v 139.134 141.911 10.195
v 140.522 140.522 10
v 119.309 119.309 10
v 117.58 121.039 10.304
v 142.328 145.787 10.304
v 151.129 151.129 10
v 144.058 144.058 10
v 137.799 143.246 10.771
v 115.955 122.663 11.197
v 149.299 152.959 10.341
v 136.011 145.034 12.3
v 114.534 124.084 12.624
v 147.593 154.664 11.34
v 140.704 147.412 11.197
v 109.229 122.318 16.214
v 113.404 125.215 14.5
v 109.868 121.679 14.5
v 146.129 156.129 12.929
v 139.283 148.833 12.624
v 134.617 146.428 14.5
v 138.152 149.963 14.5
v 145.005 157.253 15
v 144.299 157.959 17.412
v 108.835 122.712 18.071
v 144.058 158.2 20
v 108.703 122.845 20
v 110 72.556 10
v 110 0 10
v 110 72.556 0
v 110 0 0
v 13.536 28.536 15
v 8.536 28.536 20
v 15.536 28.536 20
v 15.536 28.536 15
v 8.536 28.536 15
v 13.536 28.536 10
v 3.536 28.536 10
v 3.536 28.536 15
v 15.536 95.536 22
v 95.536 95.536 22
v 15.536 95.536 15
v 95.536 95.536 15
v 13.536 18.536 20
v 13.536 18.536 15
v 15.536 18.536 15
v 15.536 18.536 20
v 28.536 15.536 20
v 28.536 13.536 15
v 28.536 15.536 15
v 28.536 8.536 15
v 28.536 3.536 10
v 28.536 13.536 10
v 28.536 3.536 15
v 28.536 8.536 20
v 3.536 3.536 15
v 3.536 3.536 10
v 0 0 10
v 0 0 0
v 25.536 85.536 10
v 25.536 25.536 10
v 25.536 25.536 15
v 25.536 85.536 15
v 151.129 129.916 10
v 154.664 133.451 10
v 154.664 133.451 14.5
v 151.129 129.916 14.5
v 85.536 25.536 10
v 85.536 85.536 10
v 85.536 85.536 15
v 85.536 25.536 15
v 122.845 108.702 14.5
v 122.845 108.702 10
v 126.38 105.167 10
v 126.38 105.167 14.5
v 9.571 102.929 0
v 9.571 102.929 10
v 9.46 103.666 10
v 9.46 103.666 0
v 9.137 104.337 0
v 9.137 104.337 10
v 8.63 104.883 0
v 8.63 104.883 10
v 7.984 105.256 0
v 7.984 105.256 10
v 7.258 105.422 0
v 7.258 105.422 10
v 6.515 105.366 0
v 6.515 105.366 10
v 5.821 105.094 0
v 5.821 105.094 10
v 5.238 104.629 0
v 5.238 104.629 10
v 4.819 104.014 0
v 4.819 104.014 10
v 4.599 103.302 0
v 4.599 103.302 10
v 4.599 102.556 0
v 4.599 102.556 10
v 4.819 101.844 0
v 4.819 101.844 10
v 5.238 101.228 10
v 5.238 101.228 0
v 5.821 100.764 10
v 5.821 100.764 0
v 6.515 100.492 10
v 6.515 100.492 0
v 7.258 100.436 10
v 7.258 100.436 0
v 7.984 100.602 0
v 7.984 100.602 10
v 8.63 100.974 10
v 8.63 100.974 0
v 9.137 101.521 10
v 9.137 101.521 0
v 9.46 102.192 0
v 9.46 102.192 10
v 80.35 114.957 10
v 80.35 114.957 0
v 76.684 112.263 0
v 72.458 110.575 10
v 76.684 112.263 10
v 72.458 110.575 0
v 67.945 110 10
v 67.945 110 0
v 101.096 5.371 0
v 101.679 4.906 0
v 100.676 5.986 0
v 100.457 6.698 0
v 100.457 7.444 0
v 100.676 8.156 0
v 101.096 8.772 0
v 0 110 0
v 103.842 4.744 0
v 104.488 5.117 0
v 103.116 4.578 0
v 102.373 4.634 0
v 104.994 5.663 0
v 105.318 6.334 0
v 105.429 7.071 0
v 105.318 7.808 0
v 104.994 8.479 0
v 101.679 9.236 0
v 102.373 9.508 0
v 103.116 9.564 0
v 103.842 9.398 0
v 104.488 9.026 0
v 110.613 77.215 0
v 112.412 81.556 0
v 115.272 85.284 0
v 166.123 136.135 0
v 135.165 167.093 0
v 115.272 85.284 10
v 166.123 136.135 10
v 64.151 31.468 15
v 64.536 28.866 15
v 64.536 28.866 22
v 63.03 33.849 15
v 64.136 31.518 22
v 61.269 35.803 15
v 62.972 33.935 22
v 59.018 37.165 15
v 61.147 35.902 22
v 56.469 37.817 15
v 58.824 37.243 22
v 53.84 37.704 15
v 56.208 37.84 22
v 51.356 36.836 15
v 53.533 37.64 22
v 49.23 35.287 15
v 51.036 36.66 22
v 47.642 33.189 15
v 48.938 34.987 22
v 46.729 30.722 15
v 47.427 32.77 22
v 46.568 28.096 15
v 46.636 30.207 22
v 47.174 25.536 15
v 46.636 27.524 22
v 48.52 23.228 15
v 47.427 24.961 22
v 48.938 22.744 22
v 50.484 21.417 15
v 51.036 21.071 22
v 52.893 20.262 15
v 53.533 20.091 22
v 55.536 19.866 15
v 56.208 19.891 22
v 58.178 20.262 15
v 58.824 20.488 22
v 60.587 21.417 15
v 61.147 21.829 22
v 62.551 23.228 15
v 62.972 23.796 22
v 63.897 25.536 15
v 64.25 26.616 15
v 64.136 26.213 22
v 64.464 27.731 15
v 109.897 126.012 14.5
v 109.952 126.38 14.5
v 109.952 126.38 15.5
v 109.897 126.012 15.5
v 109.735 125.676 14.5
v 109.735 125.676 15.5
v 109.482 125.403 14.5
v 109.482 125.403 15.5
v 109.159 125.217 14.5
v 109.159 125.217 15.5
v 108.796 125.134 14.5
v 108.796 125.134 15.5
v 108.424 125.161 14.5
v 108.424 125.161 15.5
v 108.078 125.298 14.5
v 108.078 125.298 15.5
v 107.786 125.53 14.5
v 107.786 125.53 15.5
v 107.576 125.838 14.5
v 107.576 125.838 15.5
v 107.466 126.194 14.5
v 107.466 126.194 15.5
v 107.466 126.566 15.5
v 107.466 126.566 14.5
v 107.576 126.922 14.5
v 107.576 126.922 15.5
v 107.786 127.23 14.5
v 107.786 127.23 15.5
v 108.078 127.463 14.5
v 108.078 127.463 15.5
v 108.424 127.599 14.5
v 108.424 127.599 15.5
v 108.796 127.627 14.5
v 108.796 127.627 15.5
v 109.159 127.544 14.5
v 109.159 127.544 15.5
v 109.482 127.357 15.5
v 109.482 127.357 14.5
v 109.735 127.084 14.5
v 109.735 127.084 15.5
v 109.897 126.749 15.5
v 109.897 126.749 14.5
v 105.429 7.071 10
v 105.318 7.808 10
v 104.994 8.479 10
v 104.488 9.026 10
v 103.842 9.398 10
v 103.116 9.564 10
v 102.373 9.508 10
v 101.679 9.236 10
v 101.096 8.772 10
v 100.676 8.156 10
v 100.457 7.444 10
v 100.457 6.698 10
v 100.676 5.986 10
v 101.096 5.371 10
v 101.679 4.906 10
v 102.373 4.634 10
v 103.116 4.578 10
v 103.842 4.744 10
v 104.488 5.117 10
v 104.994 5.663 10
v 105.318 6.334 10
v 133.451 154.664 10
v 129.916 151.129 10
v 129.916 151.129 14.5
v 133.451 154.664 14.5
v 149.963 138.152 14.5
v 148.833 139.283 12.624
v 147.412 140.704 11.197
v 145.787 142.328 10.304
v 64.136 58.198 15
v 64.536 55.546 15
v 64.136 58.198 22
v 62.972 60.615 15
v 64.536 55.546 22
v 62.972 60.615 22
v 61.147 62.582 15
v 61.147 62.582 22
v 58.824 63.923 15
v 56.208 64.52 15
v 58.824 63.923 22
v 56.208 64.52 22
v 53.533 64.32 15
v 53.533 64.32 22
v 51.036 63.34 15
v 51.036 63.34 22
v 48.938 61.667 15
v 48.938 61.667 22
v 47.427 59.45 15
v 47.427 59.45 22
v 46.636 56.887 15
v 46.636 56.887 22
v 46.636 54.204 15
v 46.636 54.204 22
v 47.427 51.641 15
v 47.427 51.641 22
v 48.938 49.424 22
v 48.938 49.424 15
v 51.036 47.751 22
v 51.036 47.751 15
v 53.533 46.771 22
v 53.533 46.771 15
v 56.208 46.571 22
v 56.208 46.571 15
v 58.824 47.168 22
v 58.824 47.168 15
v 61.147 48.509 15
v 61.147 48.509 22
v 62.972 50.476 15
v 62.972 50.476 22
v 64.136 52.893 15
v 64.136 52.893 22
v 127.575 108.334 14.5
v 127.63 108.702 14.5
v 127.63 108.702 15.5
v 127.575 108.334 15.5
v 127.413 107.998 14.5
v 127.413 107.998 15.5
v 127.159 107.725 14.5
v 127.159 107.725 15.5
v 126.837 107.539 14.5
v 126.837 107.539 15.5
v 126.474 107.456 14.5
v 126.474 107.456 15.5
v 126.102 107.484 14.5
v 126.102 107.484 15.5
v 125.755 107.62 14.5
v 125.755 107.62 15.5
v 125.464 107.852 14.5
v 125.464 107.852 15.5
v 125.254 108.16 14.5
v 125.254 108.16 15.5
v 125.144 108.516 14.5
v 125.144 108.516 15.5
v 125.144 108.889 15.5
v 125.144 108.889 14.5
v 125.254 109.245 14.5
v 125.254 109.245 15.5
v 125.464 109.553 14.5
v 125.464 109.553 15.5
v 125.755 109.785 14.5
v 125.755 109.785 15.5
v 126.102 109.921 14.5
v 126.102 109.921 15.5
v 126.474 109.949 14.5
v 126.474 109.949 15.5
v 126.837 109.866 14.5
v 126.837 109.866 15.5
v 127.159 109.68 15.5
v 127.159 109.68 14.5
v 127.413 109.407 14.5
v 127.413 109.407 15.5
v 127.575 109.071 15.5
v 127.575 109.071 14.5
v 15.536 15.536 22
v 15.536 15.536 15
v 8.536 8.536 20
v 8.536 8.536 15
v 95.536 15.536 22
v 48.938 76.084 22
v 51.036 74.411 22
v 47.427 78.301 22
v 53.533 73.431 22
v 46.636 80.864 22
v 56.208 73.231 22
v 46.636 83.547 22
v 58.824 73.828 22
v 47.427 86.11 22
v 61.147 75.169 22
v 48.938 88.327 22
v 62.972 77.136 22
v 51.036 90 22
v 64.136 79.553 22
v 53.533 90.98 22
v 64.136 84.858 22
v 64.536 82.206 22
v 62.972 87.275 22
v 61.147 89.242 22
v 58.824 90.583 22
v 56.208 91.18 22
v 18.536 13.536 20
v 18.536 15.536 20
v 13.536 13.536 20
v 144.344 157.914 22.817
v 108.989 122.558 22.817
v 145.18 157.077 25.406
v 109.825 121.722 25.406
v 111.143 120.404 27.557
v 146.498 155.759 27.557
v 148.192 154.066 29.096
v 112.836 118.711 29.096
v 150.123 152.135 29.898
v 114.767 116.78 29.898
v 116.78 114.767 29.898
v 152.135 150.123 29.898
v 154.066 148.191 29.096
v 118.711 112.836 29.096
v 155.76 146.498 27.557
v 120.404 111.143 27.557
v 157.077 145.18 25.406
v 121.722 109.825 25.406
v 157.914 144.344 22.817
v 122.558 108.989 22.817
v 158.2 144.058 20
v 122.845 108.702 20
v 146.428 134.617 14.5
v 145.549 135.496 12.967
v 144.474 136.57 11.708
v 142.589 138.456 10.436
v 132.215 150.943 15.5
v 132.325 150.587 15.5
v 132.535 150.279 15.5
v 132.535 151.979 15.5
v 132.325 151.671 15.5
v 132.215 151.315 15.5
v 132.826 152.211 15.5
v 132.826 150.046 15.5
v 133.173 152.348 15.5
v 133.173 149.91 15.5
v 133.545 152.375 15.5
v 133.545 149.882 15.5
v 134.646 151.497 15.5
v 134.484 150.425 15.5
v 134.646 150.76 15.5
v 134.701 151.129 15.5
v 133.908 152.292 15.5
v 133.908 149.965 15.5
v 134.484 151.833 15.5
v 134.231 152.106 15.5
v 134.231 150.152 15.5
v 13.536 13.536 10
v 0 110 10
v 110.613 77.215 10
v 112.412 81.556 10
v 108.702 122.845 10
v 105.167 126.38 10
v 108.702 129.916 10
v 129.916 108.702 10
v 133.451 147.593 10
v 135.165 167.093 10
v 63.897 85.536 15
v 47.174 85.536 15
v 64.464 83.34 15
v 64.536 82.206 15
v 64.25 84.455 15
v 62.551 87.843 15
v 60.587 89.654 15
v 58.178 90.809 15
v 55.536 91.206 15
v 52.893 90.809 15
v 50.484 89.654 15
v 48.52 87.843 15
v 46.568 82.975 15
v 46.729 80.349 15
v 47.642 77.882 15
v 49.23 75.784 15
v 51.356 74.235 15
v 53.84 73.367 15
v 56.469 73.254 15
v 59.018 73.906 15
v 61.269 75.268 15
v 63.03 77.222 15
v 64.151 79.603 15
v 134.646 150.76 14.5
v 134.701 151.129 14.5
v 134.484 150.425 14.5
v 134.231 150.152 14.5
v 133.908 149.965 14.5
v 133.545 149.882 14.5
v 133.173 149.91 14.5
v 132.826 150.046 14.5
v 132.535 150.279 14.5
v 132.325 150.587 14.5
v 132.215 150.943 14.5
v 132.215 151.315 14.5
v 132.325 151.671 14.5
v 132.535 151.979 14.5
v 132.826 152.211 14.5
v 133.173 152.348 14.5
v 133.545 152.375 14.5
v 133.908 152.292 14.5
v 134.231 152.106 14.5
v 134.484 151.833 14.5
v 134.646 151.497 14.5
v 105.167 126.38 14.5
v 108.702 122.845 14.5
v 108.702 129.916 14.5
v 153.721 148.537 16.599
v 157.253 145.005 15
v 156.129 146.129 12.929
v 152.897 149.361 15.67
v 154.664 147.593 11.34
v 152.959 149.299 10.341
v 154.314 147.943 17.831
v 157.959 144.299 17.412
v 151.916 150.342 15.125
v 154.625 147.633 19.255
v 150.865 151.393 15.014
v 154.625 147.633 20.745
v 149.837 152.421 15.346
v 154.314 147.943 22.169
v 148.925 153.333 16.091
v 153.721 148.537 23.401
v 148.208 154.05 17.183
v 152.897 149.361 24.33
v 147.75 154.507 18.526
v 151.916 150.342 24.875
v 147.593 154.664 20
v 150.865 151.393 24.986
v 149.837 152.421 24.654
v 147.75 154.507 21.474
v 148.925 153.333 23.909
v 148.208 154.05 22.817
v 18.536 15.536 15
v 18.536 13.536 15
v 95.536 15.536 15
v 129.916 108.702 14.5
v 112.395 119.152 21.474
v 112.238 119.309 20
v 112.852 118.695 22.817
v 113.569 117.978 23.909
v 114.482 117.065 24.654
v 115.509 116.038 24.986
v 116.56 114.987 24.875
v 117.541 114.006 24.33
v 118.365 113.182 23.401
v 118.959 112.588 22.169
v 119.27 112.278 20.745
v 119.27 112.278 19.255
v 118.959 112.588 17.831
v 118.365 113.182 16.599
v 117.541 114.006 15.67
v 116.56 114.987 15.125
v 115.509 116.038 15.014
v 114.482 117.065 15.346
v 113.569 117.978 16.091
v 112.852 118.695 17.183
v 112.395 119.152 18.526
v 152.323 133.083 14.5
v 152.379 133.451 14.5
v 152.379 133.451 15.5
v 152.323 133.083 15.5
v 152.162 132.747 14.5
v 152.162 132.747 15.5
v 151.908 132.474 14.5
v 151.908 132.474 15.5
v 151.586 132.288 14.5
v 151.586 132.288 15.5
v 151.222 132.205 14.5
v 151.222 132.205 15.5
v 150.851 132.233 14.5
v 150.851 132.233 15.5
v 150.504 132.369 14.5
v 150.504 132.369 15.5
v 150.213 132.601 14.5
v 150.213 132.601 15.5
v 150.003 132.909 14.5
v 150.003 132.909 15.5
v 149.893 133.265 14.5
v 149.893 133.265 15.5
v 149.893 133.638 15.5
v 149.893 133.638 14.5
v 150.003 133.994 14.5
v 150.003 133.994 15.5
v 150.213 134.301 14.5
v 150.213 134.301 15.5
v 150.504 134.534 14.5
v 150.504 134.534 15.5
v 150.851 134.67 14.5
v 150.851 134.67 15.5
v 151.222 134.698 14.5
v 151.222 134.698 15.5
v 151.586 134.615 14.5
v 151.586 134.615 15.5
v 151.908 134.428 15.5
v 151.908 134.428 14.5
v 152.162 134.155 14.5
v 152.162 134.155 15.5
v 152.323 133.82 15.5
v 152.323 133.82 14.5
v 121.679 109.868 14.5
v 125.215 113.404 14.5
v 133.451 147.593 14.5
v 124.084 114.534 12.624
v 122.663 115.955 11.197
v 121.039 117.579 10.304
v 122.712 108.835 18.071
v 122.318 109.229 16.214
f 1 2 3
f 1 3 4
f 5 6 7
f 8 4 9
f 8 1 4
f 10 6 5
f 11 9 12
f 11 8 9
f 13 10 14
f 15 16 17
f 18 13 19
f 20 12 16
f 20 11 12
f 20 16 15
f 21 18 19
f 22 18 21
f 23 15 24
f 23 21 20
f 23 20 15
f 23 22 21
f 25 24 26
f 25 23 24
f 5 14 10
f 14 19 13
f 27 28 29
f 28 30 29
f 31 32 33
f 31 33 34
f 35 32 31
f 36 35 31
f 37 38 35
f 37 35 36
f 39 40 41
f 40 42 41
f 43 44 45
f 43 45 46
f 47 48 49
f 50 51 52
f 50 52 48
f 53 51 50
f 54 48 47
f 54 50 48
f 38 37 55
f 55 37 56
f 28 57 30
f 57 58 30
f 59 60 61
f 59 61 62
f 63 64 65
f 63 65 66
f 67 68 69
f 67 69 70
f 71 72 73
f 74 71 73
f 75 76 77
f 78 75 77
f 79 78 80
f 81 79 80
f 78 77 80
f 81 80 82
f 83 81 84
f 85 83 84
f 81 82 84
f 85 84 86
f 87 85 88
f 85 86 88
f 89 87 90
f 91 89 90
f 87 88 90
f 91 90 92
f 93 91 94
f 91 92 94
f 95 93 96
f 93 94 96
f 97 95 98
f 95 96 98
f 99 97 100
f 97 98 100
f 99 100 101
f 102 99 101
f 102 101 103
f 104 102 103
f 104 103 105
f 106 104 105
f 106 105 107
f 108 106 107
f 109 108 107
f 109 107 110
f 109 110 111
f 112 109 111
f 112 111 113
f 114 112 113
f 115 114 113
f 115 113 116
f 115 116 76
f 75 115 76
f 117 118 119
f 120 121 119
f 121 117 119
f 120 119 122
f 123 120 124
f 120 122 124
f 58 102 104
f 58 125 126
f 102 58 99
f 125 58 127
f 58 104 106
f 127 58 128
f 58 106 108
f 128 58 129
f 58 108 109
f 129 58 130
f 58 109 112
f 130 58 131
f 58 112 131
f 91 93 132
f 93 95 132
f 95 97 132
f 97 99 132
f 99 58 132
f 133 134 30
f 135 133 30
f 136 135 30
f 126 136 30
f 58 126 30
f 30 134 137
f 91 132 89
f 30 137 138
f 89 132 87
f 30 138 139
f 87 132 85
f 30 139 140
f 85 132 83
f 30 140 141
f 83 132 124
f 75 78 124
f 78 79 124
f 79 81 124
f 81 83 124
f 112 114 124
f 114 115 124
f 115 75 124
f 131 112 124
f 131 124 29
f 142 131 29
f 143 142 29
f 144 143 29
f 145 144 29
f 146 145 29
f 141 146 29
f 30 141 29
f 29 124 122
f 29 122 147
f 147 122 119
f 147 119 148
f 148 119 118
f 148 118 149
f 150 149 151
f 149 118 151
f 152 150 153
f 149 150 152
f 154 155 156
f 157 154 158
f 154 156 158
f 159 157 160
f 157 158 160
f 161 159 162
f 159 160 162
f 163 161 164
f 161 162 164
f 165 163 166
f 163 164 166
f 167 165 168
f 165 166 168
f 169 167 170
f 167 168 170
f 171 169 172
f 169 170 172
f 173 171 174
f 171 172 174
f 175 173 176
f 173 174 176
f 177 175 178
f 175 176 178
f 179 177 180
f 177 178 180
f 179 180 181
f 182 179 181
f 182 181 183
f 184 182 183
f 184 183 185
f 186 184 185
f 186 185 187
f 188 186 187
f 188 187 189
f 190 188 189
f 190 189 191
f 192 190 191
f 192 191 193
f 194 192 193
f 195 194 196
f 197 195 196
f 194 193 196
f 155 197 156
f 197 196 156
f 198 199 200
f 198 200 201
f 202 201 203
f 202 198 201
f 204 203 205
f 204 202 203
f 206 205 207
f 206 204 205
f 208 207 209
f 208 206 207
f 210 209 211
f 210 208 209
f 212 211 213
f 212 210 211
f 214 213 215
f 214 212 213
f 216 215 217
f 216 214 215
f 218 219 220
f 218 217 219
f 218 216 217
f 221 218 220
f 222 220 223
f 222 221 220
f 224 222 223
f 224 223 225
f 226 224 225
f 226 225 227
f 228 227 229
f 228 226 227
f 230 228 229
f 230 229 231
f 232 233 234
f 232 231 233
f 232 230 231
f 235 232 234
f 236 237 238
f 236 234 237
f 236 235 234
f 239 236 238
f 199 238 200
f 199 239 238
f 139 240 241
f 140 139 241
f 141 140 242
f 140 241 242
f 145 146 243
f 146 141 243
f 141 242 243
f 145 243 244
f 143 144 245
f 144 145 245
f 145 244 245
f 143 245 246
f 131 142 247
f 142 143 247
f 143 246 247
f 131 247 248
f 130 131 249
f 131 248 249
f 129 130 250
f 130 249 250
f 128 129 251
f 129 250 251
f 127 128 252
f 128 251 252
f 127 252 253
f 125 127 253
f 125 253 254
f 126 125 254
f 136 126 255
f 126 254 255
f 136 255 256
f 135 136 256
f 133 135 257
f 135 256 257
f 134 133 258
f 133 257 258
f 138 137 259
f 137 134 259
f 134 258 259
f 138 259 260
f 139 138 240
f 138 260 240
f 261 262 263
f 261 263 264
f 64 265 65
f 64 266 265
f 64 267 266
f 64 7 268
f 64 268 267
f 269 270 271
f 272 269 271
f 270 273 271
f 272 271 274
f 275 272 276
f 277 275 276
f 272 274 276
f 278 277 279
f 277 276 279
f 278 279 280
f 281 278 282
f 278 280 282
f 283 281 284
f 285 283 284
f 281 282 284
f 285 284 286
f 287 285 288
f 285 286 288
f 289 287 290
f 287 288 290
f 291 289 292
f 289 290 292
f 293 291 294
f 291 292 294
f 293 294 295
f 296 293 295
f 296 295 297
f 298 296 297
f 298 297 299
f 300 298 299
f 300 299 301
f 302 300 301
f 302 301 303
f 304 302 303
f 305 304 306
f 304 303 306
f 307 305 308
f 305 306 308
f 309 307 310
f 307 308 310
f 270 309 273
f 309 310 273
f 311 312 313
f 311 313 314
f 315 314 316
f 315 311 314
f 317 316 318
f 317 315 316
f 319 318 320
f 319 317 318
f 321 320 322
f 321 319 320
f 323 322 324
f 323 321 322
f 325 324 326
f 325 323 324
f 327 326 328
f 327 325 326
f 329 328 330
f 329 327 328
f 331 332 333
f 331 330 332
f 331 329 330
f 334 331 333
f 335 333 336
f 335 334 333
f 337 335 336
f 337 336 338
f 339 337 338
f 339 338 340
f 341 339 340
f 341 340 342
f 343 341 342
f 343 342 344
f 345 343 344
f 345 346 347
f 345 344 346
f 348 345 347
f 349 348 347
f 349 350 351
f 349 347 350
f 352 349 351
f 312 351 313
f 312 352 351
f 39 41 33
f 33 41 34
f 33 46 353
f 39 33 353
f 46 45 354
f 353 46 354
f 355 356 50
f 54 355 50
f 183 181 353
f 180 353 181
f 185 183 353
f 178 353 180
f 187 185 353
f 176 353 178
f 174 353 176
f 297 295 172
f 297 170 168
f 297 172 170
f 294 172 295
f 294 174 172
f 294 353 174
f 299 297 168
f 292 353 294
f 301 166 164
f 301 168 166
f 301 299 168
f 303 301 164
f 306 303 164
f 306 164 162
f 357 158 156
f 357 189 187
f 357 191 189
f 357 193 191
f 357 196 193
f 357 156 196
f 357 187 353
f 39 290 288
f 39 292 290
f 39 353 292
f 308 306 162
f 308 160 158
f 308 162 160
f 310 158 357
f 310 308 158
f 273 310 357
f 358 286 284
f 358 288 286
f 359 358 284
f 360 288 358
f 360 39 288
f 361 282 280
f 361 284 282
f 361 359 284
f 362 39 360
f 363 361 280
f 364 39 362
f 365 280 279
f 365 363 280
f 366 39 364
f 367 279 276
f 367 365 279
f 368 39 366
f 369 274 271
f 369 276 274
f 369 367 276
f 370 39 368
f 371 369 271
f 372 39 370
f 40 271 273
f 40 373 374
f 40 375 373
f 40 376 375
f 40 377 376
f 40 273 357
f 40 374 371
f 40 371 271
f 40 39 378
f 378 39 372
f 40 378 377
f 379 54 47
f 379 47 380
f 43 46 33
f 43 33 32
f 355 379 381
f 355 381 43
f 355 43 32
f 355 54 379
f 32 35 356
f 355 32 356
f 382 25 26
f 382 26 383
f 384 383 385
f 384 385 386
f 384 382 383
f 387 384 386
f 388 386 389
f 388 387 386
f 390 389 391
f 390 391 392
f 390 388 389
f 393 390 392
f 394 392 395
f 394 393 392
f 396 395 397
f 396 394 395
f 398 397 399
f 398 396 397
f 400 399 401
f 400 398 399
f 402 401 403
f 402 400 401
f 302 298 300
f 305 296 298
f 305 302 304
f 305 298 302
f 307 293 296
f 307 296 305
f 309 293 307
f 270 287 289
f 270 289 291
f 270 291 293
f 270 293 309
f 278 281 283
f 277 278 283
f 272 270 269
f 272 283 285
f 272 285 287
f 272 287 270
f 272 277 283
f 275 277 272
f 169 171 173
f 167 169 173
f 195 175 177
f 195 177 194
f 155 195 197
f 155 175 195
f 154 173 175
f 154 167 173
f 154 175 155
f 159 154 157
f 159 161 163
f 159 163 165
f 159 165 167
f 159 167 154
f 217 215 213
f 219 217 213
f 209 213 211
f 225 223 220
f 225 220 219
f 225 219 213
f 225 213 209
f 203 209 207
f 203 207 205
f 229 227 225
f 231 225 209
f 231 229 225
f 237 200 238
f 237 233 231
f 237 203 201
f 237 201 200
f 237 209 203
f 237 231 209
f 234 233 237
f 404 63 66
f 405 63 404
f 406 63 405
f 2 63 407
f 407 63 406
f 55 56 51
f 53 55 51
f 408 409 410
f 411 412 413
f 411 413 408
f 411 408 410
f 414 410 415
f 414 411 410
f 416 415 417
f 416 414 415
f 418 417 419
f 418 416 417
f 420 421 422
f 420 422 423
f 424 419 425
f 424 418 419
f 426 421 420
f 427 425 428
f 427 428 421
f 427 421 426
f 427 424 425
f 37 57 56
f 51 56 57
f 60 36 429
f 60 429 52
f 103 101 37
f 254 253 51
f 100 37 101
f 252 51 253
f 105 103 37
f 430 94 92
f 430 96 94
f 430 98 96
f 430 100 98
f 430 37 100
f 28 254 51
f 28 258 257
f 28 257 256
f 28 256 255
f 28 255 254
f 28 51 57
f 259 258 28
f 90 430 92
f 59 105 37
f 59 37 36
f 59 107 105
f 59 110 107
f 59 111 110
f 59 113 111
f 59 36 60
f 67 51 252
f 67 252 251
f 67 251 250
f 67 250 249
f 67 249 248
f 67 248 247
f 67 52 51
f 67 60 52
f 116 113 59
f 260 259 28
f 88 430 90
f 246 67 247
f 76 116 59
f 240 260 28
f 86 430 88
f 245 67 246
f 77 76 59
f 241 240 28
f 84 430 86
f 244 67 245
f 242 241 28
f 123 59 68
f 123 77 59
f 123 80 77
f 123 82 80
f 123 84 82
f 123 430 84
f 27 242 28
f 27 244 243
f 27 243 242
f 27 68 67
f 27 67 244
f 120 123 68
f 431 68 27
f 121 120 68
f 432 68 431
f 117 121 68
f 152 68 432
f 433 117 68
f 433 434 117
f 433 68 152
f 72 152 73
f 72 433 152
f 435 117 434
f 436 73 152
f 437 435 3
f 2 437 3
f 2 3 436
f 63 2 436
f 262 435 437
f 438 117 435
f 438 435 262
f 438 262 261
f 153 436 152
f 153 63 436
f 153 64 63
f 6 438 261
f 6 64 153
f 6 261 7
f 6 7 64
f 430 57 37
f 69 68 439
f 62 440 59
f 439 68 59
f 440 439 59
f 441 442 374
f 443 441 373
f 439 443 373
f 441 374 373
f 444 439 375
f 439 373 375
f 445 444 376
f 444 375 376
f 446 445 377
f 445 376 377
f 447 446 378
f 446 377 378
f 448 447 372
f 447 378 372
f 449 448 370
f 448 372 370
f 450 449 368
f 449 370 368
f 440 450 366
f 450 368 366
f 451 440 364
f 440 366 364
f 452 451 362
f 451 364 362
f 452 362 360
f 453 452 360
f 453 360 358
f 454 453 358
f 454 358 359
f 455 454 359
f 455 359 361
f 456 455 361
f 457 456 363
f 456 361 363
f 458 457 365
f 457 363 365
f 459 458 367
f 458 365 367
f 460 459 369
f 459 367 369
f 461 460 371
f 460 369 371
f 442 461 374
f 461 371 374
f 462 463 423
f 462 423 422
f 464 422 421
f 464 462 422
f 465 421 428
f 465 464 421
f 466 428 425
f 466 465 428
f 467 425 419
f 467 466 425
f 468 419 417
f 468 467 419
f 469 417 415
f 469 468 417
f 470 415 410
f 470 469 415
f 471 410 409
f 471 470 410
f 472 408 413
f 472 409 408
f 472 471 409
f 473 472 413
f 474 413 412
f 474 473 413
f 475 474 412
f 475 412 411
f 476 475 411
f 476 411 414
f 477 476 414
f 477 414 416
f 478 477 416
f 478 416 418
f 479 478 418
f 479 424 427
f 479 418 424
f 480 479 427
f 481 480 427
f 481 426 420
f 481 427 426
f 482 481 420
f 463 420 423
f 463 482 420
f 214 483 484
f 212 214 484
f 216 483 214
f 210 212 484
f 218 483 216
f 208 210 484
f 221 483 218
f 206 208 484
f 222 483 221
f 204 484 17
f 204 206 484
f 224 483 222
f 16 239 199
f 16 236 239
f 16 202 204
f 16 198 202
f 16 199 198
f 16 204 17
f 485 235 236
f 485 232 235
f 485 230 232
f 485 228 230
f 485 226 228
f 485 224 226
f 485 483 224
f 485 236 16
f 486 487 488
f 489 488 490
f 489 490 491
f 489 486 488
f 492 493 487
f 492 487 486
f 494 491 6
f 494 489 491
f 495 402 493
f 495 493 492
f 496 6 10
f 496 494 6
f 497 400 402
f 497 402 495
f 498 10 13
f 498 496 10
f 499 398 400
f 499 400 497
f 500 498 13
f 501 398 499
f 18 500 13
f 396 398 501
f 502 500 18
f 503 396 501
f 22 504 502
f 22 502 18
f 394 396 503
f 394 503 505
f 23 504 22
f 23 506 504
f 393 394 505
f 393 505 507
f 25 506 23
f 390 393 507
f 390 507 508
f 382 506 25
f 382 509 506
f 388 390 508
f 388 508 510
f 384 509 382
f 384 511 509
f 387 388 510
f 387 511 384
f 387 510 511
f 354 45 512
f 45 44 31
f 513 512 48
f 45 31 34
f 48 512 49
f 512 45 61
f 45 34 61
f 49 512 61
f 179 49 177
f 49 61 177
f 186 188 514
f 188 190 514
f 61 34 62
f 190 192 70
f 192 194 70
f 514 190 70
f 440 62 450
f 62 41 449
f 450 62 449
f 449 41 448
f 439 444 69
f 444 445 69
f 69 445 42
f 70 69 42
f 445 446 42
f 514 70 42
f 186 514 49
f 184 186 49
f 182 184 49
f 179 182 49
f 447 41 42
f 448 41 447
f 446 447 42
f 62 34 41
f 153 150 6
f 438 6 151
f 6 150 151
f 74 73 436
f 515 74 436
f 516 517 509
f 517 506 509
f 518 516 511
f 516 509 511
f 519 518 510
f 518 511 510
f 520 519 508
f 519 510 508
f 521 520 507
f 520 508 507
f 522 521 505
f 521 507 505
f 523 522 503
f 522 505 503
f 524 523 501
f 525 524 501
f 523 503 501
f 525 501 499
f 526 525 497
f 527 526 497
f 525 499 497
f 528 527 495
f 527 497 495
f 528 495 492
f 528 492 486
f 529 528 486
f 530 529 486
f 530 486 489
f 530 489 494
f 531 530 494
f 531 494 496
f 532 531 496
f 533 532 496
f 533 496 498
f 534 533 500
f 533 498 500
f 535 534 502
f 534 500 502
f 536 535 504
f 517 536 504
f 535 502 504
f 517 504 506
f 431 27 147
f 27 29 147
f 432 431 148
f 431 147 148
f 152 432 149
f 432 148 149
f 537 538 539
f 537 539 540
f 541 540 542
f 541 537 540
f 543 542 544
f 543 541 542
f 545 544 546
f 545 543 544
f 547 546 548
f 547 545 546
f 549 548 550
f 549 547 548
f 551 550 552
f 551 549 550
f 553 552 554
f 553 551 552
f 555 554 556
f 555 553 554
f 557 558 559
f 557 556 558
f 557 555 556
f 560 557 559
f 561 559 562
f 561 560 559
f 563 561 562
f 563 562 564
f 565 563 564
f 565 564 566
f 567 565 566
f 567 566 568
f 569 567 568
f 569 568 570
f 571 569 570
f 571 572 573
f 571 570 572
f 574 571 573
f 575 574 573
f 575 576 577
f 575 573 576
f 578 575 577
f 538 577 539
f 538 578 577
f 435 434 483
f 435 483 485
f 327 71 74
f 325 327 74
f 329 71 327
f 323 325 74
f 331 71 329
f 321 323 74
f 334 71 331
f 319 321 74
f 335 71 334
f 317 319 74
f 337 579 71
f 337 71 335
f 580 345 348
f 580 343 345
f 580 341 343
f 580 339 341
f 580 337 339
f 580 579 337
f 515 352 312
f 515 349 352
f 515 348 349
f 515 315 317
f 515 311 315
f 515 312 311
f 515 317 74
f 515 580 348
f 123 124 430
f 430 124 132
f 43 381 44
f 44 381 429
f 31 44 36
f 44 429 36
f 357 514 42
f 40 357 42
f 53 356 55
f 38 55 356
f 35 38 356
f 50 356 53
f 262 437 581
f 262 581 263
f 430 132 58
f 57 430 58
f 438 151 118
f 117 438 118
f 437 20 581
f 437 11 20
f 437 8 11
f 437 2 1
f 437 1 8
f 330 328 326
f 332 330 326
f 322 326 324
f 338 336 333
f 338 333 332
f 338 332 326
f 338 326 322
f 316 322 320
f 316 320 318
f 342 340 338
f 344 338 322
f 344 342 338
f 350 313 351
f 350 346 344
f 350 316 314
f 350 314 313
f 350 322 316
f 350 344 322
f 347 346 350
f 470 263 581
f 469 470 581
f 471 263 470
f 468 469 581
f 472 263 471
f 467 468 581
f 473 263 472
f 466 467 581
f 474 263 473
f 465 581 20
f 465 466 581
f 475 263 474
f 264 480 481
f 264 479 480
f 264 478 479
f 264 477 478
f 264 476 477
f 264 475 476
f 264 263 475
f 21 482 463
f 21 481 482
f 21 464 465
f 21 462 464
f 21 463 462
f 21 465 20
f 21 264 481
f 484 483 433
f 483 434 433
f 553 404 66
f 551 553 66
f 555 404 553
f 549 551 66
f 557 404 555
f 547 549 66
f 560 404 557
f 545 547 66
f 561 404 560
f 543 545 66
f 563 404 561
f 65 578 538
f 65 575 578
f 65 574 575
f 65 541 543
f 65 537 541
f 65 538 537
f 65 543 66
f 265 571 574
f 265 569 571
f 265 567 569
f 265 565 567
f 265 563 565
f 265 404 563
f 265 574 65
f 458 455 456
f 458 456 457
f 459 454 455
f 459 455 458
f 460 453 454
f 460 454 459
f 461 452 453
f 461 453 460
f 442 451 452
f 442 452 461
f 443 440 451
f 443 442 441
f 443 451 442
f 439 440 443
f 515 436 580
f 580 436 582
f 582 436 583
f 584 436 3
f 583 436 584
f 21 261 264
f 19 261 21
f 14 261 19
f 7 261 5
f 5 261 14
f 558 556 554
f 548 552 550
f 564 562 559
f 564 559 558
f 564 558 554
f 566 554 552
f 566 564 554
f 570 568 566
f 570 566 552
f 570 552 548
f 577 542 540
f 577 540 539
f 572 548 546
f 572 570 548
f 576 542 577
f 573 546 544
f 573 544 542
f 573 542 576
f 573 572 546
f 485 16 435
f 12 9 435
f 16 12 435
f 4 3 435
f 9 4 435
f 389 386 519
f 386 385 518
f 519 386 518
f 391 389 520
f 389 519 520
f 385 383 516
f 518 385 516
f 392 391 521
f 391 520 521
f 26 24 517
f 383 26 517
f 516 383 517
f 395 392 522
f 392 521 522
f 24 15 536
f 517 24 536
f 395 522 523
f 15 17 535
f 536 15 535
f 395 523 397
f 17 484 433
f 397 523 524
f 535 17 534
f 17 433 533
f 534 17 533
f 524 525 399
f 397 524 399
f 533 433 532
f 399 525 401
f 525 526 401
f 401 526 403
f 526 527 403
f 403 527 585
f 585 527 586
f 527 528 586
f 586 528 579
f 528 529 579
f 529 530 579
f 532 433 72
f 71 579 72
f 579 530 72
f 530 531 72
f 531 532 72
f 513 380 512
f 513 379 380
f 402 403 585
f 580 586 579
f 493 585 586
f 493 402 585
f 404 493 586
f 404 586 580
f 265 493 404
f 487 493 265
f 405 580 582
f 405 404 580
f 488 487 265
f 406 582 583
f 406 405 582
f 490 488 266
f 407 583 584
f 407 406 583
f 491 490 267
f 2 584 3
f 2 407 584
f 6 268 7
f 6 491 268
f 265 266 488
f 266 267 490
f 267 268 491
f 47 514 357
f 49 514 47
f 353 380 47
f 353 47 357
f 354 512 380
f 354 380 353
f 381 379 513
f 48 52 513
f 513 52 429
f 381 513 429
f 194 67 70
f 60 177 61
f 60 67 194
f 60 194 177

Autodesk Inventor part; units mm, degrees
ref_plane "YZ Plane" through (0, 0, 0) normal (1, 0, 0) x (0, 1, 0)
ref_plane "XZ Plane" through (0, 0, 0) normal (0, 1, 0) x (-1, 0, 0)
ref_plane "XY Plane" through (0, 0, 0) normal (0, 0, 1) x (1, 0, 0)
sketch "Náčrt1" plane through (0, 0, 0) normal (0, 0, 1) x (1, 0, 0)
  line L0 (0, 0) -> (110, 0)
  line L1 (110, 0) -> (110, 72.5558)
  line L2 (67.945, 110) -> (0, 110)
  line L3 (0, 110) -> (0, 0)
  line L4 (0, 0) -> (268.4899, 0) construction
  line L5 (166.1231, 136.1347) -> (115.2721, 85.2837)
  line L6 (135.1648, 167.093) -> (80.3503, 114.9574)
  line L7 (166.1231, 136.1347) -> (135.1648, 167.093)
  arc A0 (115.2721, 85.2837) -> (110, 72.5558) centre (128, 72.5558) ccw
  arc A1 (67.945, 110) -> (80.3503, 114.9574) centre (67.945, 128) ccw
extrude "Vysunutí1" add sketch "Náčrt1" along normal blind 10
sketch "Náčrt2" plane through (0, 0, 10) normal (0, 0, 1) x (1, 0, 0)
  line L0 (0, 0) -> (110, 0) projected
  line L1 (0, 0) -> (5, 0) construction
  line L2 (3.5355, 3.5355) -> (13.5355, 3.5355)
  line L3 (8.5355, 28.5355) -> (3.5355, 28.5355)
  line L4 (3.5355, 28.5355) -> (3.5355, 3.5355)
  line L5 (3.5355, 3.5355) -> (28.5355, 3.5355)
  line L6 (28.5355, 3.5355) -> (28.5355, 8.5355)
  line L7 (3.5355, 13.5355) -> (3.5355, 3.5355)
  line L8 (13.5355, 28.5355) -> (8.5355, 28.5355)
  line L9 (8.5355, 28.5355) -> (8.5355, 13.5355)
  line L10 (13.5355, 13.5355) -> (13.5355, 18.5355)
  line L11 (28.5355, 13.5355) -> (13.5355, 13.5355)
  line L12 (8.5355, 13.5355) -> (8.5355, 8.5355)
  line L13 (8.5355, 8.5355) -> (28.5355, 8.5355)
  line L14 (28.5355, 8.5355) -> (28.5355, 13.5355)
  line L15 (13.5355, 28.5355) -> (13.5355, 18.5355)
  line L16 (13.5355, 18.5355) -> (8.5355, 18.5355)
extrude "Vysunutí2" add sketch "Náčrt2" along normal blind 5 contours L4 L3 L9 L12 L13 L6 L5 L2
extrude "Vysunutí3" add sketch "Náčrt2" along normal blind 10 contours L13 L12 L9 L16 L10 L11 L14 | L8 L15 L16 L9
sketch "Náčrt5" plane through (13.5355, 13.5355, 10) normal (1, 0, 0) x (0, 0, -1)
  line L0 (-5, -5) -> (-5, 15) projected
  line L1 (-10, 15) -> (-5, 15)
  line L2 (-5, 15) -> (-5, 5)
  line L3 (-5, 5) -> (-10, 5)
  line L4 (-10, 5) -> (-10, 15)
  point P0 (10, -13.5355)
extrude "Vysunutí4" add sketch "Náčrt5" along normal blind 2
sketch "Náčrt7" plane through (13.5355, 13.5355, 10) normal (0, 1, 0) x (1, 0, 0)
  line L0 (15, -10) -> (0, -10) projected
  line L1 (15, -5) -> (-5, -5) projected
  line L2 (15, -10) -> (5, -10)
  line L3 (5, -10) -> (5, -5)
  line L4 (5, -5) -> (15, -5)
  line L5 (15, -5) -> (15, -10)
  point P0 (-13.5355, 10)
extrude "Vysunutí5" add sketch "Náčrt7" along normal blind 2
sketch "Náčrt8" plane through (0, 0, 10) normal (0, 0, 1) x (1, 0, 0)
  line L0 (0, 110) -> (0, 0) projected
  line L1 (0, 110) -> (10, 110) construction
  circle A0 centre (7.0711, 102.9289) radius 2.5
extrude "Vysunutí6" cut sketch "Náčrt8" against normal blind 20
sketch "Náčrt9" plane through (0, 0, 10) normal (0, 0, 1) x (1, 0, 0)
  line L0 (0, 0) -> (110, 0) projected
  line L1 (110, 0) -> (102.9289, 7.0711)
  line L2 (110, 0) -> (120, 0) construction
  circle A0 centre (102.9289, 7.0711) radius 2.5
  dimension "d36" = 5
extrude "Vysunutí7" cut sketch "Náčrt9" against normal blind 20
sketch "Náčrt13" plane through (135.1648, 167.093, 0) normal (0.7071, 0.7071, 0) x (-0.7071, 0.7071, 0)
  line L0 (-22.5767, 0) -> (-22.5767, 10) projected
  line L1 (-22.5767, 15) -> (-22.5767, 20) projected
  line L2 (-22.5767, 20) -> (-36.7188, 20) projected
  line L3 (55.2051, 10) -> (-22.5767, 10) projected
  circle A0 centre (-22.5767, 20) radius 10
  dimension "d43" = 10
extrude "Vysunutí8" add sketch "Náčrt13" against normal blind 50
sketch "Náčrt14" plane through (151.1289, 151.1289, 20) normal (0.7071, 0.7071, 0) x (-0.7071, 0.7071, 0)
  line L0 (0, 0) -> (-14.1421, 0) projected
  circle A0 centre (0, 0) radius 5
  line L1 (0, -5) -> (14.1421, -5) projected
  point P0 (0, -20)
extrude "Vysunutí9" cut sketch "Náčrt14" against normal blind 50
sketch "Náčrt15" plane through (0, 0, 10) normal (0, 0, 1) x (1, 0, 0)
  line L0 (108.7025, 122.8446) -> (122.8446, 108.7025) projected
  line L1 (122.8446, 108.7025) -> (126.3801, 105.1669)
  line L2 (115.2721, 85.2837) -> (166.1231, 136.1347) projected
  line L3 (126.3801, 105.1669) -> (129.9157, 108.7025)
  line L4 (129.9157, 108.7025) -> (108.7025, 129.9157)
  line L5 (112.238, 126.3801) -> (108.7025, 129.9157)
  line L6 (105.1669, 126.3801) -> (108.7025, 129.9157)
  line L7 (105.1669, 126.3801) -> (122.8446, 108.7025)
  point P0 (0, 0)
  point P1 (115.7735, 115.7735)
  dimension "d48" = 5
extrude "Vysunutí10" add sketch "Náčrt15" along normal blind 4.5
sketch "Náčrt16" plane through (0, 0, 10) normal (0, 0, 1) x (1, 0, 0)
  line L0 (119.3091, 119.3091) -> (129.9157, 108.7025) projected
  line L1 (151.1289, 136.9867) -> (154.6644, 133.4512)
  line L2 (154.6644, 133.4512) -> (151.1289, 129.9157)
  line L3 (151.1289, 129.9157) -> (133.4512, 147.5933)
  line L4 (135.1648, 167.093) -> (80.3503, 114.9574) projected
  line L5 (133.4512, 154.6644) -> (151.1289, 136.9867)
  line L6 (144.0578, 158.1999) -> (108.7025, 122.8446) projected
  line L7 (133.4512, 147.5933) -> (129.9157, 151.1289)
  line L8 (129.9157, 151.1289) -> (133.4512, 154.6644)
  point P0 (0, 0)
extrude "Vysunutí11" add sketch "Náčrt16" along normal blind 4.5
sketch "Náčrt17" plane through (0, 0, 14.5) normal (0, 0, 1) x (1, 0, 0)
  line L0 (108.7025, 129.9157) -> (105.1669, 126.3801) projected
  circle A0 centre (108.7025, 126.3801) radius 1.25
  point P0 (0, 0)
extrude "Vysunutí12" add sketch "Náčrt17" along normal blind 1
sketch "Náčrt18" plane through (0, 0, 14.5) normal (0, 0, 1) x (1, 0, 0)
  line L0 (140.5223, 140.5223) -> (129.9157, 151.1289) projected
  line L1 (129.9157, 151.1289) -> (133.4512, 154.6644) projected
  circle A0 centre (133.4512, 151.1289) radius 1.25
  point P0 (0, 0)
extrude "Vysunutí13" add sketch "Náčrt18" along normal blind 1
sketch "Náčrt19" plane through (0, 0, 14.5) normal (0, 0, 1) x (1, 0, 0)
  line L0 (154.6644, 133.4512) -> (151.1289, 129.9157) projected
  circle A0 centre (151.1289, 133.4512) radius 1.25
  point P0 (0, 0)
extrude "Vysunutí14" add sketch "Náčrt19" along normal blind 1
sketch "Náčrt20" plane through (0, 0, 14.5) normal (0, 0, 1) x (1, 0, 0)
  line L0 (119.3091, 119.3091) -> (129.9157, 108.7025) projected
  line L1 (126.3801, 105.1669) -> (105.1669, 126.3801) projected
  circle A0 centre (126.3801, 108.7025) radius 1.25
  point P0 (0, 0)
extrude "Vysunutí15" add sketch "Náčrt20" along normal blind 1
sketch "Náčrt22" plane through (0, 0, 15) normal (0, 0, 1) x (1, 0, 0)
  line L0 (18.5355, 13.5355) -> (18.5355, 15.5355) projected
  line L1 (18.5355, 15.5355) -> (15.5355, 15.5355)
  line L2 (15.5355, 15.5355) -> (95.5355, 15.5355)
  line L3 (95.5355, 15.5355) -> (95.5355, 95.5355)
  line L4 (95.5355, 95.5355) -> (15.5355, 95.5355)
  line L5 (15.5355, 95.5355) -> (15.5355, 15.5355)
  point P0 (0, 0)
  dimension "d63" = 80
  dimension "d64" = 80
extrude "Vysunutí16" add sketch "Náčrt22" along normal blind 7
sketch "Náčrt25" plane through (0, 0, 10) normal (0, 0, 1) x (1, 0, 0)
  line L0 (95.5355, 95.5355) -> (95.5355, 85.5355)
  line L1 (95.5355, 15.5355) -> (95.5355, 95.5355) projected
  line L2 (15.5355, 95.5355) -> (15.5355, 15.5355) projected
  line L3 (85.5355, 85.5355) -> (25.5355, 85.5355)
  line L4 (95.5355, 85.5355) -> (85.5355, 85.5355)
  line L5 (85.5355, 85.5355) -> (85.5355, 25.5355)
  line L6 (85.5355, 25.5355) -> (25.5355, 25.5355)
  line L7 (25.5355, 25.5355) -> (25.5355, 85.5355)
  point P0 (0, 0)
extrude "Vysunutí17" add sketch "Náčrt25" along normal blind 5
sketch "Náčrt26" plane through (0, 0, 22) normal (0, 0, 1) x (1, 0, 0)
  line L0 (95.5355, 95.5355) -> (15.5355, 95.5355) projected
  line L1 (28.5355, 15.5355) -> (95.5355, 15.5355) projected
  circle A0 centre (55.5355, 82.2055) radius 9
  circle A1 centre (55.5355, 55.5455) radius 9
  circle A2 centre (55.5355, 28.8655) radius 9
  point P0 (0, 0)
extrude "Vysunutí18" cut sketch "Náčrt26" against normal blind 7
sketch "Náčrt29" plane through (0, 0, 10) normal (0, 0, 1) x (1, 0, 0)
  point P0 (0, 0)
properties part number "Součást1"
